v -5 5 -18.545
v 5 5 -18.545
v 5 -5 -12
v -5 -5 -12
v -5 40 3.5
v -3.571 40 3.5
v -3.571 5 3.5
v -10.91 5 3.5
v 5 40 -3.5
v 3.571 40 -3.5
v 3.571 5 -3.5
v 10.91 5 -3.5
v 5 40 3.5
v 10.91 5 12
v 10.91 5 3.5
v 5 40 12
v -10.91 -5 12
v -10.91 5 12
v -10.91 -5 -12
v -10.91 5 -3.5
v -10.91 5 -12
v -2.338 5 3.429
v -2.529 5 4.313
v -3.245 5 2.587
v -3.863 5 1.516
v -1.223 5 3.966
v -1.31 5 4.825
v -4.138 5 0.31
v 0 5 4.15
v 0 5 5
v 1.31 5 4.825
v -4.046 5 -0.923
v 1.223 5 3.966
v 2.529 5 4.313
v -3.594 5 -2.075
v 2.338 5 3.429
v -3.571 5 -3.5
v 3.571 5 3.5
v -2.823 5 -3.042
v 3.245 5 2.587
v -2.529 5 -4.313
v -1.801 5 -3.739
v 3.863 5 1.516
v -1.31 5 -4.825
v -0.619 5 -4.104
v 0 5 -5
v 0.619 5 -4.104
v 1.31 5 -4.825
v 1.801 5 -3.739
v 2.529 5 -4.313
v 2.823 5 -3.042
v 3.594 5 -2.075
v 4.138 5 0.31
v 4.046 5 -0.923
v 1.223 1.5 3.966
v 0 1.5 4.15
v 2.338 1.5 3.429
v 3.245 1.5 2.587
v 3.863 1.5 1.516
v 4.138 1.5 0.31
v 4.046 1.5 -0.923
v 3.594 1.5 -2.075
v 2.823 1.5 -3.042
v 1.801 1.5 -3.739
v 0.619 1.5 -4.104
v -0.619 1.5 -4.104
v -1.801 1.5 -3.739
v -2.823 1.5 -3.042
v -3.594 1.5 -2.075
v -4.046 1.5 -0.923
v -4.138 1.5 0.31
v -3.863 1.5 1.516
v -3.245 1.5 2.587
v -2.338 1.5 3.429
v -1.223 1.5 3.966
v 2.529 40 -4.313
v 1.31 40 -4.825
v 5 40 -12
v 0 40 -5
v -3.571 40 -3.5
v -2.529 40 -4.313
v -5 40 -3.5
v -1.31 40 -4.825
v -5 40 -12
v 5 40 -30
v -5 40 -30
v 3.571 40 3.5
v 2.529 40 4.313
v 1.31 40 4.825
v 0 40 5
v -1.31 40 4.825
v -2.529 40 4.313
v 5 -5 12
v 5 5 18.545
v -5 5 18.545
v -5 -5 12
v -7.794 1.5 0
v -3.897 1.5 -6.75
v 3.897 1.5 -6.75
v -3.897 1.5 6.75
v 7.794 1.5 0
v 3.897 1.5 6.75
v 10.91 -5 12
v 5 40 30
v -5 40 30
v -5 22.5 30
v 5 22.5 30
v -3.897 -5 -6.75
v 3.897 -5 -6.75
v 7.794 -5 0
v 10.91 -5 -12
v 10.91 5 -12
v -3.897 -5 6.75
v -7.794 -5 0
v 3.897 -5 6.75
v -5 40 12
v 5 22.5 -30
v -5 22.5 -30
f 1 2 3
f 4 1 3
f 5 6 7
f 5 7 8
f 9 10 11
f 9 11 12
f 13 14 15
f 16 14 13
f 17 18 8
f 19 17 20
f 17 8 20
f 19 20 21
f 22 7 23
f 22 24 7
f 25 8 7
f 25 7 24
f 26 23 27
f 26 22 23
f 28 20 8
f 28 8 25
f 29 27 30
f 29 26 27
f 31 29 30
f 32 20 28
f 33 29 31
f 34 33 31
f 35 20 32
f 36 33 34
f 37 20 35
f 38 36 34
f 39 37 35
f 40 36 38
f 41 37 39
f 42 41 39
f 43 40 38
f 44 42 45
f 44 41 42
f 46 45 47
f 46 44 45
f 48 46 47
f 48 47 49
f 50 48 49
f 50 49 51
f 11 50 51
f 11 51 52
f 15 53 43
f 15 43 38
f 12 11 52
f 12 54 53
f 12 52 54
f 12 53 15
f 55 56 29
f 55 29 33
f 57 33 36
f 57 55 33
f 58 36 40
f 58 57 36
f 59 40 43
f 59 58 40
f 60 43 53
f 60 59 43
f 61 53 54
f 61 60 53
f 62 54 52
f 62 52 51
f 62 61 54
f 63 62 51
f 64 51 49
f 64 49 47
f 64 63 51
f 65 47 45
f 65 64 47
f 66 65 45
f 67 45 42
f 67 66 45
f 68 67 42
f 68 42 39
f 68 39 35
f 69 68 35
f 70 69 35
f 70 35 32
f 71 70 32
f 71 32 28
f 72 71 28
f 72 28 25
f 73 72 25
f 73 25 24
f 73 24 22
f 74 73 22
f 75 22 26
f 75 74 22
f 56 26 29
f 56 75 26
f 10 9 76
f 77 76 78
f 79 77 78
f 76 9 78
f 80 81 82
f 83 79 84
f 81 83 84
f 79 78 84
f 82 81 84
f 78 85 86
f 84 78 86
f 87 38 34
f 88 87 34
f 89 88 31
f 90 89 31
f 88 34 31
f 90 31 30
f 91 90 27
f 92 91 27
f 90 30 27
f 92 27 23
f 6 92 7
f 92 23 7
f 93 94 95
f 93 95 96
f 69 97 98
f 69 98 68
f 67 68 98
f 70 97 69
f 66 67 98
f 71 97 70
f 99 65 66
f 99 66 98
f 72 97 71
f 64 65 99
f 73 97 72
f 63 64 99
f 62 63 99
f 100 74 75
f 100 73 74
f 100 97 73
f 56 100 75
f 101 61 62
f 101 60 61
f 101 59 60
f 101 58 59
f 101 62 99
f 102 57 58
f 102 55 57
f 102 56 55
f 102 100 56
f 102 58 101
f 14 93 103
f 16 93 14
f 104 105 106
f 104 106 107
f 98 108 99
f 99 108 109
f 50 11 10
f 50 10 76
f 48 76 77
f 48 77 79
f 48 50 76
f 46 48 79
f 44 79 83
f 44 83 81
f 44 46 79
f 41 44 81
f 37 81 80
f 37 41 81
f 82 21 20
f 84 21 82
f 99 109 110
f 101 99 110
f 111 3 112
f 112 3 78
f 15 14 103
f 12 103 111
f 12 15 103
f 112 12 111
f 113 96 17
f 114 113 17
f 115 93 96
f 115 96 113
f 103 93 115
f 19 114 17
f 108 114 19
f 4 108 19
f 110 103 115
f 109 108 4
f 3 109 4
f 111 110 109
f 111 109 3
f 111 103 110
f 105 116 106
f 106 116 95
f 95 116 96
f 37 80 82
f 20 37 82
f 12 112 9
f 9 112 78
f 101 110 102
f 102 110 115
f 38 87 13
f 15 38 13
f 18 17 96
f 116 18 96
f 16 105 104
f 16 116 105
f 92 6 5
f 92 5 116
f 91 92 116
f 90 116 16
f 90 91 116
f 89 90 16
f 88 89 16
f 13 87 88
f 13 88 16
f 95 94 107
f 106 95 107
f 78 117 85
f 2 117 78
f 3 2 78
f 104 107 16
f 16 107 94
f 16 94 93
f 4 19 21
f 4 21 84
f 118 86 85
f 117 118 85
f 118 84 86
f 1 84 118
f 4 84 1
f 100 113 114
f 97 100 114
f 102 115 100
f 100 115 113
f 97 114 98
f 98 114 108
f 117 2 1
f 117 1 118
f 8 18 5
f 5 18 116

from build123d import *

# Parameters (mm, degrees)
SKETCH1_W           = 21.82
SKETCH1_H           = 24
SKETCH1_R           = 4.15
BOSS_EXTRUDE1_DEPTH = 5
CUT_EXTRUDE1_DEPTH  = 6.5
BOSS_EXTRUDE2_DEPTH = 35
BOSS_EXTRUDE3_DEPTH = 10
CUT_EXTRUDE2_DEPTH  = 10
BOSS_EXTRUDE4_START = -18
BOSS_EXTRUDE4_DEPTH = 8.5


with BuildPart() as part:
    # Sketch1 → Boss-Extrude1 (new, symmetric)
    with BuildSketch(Plane(origin=(0, 0, 0), x_dir=(1, 0, 0), z_dir=(0, 1, 0))):
        Rectangle(SKETCH1_W, SKETCH1_H)
        with Locations(Location((0, 0, 0), (0, 0, 270))):
            Circle(SKETCH1_R, mode=Mode.SUBTRACT)
    extrude(amount=BOSS_EXTRUDE1_DEPTH, both=True)

    # Sketch2 → Cut-Extrude1 (cut)
    with BuildSketch(Plane.XZ.offset(5)):
        Polygon((-7.794228634, 0), (-3.897114317, -6.75), (3.897114317, -6.75), (7.794228634, 0), (3.897114317, 6.75), (-3.897114317, 6.75), align=None)
    extrude(amount=-CUT_EXTRUDE1_DEPTH, mode=Mode.SUBTRACT)

    # Sketch3 → Boss-Extrude2 (add)
    with BuildSketch(Plane(origin=(0, 5, 0), x_dir=(1, 0, 0), z_dir=(0, 1, 0))):
        with BuildLine():
            Line((-3.570714214, 3.5), (-5, 3.5))
            Line((-5, 3.5), (-5, 30))
            Line((-5, 30), (5, 30))
            Line((5, 30), (5, 3.5))
            Line((5, 3.5), (3.570714214, 3.5))
            ThreePointArc((3.570714214, 3.5), (0, 5), (-3.570714214, 3.5))
        make_face()
        with BuildLine():
            Line((-5, -30), (5, -30))
            Line((5, -30), (5, -3.5))
            Line((5, -3.5), (3.570714214, -3.5))
            ThreePointArc((3.570714214, -3.5), (0, -5), (-3.570714214, -3.5))
            Line((-3.570714214, -3.5), (-5, -3.5))
            Line((-5, -3.5), (-5, -30))
        make_face()
    extrude(amount=BOSS_EXTRUDE2_DEPTH)

    # Sketch4 → Boss-Extrude3 (add)
    with BuildSketch(Plane(origin=(5, 0, 0), x_dir=(0, 0, -1), z_dir=(1, 0, 0))):
        Polygon((-10.166411733, -5), (-10.1597678, 5.000488901), (-30, 22.5), (-12, -5), align=None)
        Polygon((10.166411733, -5), (10.1597678, 5.000488901), (30, 22.5), (12, -5), align=None)
    extrude(amount=-BOSS_EXTRUDE3_DEPTH)

    # Sketch5 → Cut-Extrude2 (cut)
    with BuildSketch(Plane(origin=(5, 0, 0), x_dir=(0, 0, -1), z_dir=(1, 0, 0))):
        Polygon((-18.545454545, 5), (-30, 22.5), (-30, 5), align=None)
        Polygon((30, 22.5), (30, 5), (18.545454545, 5), align=None)
    extrude(amount=-CUT_EXTRUDE2_DEPTH, mode=Mode.SUBTRACT)

    # Sketch6 → Boss-Extrude4 (add)
    with BuildSketch(Plane(origin=(0, 0, -30), x_dir=(-1, 0, 0), z_dir=(0, 0, -1)).offset(BOSS_EXTRUDE4_START)):
        Polygon((-10.91, 5), (-5, 40), (-5, 5), align=None)
        Polygon((5, 40), (5, 5), (10.91, 5), align=None)
    boss_extrude4 = extrude(amount=-BOSS_EXTRUDE4_DEPTH)

    # Mirror9: Boss-Extrude4 across plane
    add(boss_extrude4.mirror(Plane.XY))


solid = part.part
